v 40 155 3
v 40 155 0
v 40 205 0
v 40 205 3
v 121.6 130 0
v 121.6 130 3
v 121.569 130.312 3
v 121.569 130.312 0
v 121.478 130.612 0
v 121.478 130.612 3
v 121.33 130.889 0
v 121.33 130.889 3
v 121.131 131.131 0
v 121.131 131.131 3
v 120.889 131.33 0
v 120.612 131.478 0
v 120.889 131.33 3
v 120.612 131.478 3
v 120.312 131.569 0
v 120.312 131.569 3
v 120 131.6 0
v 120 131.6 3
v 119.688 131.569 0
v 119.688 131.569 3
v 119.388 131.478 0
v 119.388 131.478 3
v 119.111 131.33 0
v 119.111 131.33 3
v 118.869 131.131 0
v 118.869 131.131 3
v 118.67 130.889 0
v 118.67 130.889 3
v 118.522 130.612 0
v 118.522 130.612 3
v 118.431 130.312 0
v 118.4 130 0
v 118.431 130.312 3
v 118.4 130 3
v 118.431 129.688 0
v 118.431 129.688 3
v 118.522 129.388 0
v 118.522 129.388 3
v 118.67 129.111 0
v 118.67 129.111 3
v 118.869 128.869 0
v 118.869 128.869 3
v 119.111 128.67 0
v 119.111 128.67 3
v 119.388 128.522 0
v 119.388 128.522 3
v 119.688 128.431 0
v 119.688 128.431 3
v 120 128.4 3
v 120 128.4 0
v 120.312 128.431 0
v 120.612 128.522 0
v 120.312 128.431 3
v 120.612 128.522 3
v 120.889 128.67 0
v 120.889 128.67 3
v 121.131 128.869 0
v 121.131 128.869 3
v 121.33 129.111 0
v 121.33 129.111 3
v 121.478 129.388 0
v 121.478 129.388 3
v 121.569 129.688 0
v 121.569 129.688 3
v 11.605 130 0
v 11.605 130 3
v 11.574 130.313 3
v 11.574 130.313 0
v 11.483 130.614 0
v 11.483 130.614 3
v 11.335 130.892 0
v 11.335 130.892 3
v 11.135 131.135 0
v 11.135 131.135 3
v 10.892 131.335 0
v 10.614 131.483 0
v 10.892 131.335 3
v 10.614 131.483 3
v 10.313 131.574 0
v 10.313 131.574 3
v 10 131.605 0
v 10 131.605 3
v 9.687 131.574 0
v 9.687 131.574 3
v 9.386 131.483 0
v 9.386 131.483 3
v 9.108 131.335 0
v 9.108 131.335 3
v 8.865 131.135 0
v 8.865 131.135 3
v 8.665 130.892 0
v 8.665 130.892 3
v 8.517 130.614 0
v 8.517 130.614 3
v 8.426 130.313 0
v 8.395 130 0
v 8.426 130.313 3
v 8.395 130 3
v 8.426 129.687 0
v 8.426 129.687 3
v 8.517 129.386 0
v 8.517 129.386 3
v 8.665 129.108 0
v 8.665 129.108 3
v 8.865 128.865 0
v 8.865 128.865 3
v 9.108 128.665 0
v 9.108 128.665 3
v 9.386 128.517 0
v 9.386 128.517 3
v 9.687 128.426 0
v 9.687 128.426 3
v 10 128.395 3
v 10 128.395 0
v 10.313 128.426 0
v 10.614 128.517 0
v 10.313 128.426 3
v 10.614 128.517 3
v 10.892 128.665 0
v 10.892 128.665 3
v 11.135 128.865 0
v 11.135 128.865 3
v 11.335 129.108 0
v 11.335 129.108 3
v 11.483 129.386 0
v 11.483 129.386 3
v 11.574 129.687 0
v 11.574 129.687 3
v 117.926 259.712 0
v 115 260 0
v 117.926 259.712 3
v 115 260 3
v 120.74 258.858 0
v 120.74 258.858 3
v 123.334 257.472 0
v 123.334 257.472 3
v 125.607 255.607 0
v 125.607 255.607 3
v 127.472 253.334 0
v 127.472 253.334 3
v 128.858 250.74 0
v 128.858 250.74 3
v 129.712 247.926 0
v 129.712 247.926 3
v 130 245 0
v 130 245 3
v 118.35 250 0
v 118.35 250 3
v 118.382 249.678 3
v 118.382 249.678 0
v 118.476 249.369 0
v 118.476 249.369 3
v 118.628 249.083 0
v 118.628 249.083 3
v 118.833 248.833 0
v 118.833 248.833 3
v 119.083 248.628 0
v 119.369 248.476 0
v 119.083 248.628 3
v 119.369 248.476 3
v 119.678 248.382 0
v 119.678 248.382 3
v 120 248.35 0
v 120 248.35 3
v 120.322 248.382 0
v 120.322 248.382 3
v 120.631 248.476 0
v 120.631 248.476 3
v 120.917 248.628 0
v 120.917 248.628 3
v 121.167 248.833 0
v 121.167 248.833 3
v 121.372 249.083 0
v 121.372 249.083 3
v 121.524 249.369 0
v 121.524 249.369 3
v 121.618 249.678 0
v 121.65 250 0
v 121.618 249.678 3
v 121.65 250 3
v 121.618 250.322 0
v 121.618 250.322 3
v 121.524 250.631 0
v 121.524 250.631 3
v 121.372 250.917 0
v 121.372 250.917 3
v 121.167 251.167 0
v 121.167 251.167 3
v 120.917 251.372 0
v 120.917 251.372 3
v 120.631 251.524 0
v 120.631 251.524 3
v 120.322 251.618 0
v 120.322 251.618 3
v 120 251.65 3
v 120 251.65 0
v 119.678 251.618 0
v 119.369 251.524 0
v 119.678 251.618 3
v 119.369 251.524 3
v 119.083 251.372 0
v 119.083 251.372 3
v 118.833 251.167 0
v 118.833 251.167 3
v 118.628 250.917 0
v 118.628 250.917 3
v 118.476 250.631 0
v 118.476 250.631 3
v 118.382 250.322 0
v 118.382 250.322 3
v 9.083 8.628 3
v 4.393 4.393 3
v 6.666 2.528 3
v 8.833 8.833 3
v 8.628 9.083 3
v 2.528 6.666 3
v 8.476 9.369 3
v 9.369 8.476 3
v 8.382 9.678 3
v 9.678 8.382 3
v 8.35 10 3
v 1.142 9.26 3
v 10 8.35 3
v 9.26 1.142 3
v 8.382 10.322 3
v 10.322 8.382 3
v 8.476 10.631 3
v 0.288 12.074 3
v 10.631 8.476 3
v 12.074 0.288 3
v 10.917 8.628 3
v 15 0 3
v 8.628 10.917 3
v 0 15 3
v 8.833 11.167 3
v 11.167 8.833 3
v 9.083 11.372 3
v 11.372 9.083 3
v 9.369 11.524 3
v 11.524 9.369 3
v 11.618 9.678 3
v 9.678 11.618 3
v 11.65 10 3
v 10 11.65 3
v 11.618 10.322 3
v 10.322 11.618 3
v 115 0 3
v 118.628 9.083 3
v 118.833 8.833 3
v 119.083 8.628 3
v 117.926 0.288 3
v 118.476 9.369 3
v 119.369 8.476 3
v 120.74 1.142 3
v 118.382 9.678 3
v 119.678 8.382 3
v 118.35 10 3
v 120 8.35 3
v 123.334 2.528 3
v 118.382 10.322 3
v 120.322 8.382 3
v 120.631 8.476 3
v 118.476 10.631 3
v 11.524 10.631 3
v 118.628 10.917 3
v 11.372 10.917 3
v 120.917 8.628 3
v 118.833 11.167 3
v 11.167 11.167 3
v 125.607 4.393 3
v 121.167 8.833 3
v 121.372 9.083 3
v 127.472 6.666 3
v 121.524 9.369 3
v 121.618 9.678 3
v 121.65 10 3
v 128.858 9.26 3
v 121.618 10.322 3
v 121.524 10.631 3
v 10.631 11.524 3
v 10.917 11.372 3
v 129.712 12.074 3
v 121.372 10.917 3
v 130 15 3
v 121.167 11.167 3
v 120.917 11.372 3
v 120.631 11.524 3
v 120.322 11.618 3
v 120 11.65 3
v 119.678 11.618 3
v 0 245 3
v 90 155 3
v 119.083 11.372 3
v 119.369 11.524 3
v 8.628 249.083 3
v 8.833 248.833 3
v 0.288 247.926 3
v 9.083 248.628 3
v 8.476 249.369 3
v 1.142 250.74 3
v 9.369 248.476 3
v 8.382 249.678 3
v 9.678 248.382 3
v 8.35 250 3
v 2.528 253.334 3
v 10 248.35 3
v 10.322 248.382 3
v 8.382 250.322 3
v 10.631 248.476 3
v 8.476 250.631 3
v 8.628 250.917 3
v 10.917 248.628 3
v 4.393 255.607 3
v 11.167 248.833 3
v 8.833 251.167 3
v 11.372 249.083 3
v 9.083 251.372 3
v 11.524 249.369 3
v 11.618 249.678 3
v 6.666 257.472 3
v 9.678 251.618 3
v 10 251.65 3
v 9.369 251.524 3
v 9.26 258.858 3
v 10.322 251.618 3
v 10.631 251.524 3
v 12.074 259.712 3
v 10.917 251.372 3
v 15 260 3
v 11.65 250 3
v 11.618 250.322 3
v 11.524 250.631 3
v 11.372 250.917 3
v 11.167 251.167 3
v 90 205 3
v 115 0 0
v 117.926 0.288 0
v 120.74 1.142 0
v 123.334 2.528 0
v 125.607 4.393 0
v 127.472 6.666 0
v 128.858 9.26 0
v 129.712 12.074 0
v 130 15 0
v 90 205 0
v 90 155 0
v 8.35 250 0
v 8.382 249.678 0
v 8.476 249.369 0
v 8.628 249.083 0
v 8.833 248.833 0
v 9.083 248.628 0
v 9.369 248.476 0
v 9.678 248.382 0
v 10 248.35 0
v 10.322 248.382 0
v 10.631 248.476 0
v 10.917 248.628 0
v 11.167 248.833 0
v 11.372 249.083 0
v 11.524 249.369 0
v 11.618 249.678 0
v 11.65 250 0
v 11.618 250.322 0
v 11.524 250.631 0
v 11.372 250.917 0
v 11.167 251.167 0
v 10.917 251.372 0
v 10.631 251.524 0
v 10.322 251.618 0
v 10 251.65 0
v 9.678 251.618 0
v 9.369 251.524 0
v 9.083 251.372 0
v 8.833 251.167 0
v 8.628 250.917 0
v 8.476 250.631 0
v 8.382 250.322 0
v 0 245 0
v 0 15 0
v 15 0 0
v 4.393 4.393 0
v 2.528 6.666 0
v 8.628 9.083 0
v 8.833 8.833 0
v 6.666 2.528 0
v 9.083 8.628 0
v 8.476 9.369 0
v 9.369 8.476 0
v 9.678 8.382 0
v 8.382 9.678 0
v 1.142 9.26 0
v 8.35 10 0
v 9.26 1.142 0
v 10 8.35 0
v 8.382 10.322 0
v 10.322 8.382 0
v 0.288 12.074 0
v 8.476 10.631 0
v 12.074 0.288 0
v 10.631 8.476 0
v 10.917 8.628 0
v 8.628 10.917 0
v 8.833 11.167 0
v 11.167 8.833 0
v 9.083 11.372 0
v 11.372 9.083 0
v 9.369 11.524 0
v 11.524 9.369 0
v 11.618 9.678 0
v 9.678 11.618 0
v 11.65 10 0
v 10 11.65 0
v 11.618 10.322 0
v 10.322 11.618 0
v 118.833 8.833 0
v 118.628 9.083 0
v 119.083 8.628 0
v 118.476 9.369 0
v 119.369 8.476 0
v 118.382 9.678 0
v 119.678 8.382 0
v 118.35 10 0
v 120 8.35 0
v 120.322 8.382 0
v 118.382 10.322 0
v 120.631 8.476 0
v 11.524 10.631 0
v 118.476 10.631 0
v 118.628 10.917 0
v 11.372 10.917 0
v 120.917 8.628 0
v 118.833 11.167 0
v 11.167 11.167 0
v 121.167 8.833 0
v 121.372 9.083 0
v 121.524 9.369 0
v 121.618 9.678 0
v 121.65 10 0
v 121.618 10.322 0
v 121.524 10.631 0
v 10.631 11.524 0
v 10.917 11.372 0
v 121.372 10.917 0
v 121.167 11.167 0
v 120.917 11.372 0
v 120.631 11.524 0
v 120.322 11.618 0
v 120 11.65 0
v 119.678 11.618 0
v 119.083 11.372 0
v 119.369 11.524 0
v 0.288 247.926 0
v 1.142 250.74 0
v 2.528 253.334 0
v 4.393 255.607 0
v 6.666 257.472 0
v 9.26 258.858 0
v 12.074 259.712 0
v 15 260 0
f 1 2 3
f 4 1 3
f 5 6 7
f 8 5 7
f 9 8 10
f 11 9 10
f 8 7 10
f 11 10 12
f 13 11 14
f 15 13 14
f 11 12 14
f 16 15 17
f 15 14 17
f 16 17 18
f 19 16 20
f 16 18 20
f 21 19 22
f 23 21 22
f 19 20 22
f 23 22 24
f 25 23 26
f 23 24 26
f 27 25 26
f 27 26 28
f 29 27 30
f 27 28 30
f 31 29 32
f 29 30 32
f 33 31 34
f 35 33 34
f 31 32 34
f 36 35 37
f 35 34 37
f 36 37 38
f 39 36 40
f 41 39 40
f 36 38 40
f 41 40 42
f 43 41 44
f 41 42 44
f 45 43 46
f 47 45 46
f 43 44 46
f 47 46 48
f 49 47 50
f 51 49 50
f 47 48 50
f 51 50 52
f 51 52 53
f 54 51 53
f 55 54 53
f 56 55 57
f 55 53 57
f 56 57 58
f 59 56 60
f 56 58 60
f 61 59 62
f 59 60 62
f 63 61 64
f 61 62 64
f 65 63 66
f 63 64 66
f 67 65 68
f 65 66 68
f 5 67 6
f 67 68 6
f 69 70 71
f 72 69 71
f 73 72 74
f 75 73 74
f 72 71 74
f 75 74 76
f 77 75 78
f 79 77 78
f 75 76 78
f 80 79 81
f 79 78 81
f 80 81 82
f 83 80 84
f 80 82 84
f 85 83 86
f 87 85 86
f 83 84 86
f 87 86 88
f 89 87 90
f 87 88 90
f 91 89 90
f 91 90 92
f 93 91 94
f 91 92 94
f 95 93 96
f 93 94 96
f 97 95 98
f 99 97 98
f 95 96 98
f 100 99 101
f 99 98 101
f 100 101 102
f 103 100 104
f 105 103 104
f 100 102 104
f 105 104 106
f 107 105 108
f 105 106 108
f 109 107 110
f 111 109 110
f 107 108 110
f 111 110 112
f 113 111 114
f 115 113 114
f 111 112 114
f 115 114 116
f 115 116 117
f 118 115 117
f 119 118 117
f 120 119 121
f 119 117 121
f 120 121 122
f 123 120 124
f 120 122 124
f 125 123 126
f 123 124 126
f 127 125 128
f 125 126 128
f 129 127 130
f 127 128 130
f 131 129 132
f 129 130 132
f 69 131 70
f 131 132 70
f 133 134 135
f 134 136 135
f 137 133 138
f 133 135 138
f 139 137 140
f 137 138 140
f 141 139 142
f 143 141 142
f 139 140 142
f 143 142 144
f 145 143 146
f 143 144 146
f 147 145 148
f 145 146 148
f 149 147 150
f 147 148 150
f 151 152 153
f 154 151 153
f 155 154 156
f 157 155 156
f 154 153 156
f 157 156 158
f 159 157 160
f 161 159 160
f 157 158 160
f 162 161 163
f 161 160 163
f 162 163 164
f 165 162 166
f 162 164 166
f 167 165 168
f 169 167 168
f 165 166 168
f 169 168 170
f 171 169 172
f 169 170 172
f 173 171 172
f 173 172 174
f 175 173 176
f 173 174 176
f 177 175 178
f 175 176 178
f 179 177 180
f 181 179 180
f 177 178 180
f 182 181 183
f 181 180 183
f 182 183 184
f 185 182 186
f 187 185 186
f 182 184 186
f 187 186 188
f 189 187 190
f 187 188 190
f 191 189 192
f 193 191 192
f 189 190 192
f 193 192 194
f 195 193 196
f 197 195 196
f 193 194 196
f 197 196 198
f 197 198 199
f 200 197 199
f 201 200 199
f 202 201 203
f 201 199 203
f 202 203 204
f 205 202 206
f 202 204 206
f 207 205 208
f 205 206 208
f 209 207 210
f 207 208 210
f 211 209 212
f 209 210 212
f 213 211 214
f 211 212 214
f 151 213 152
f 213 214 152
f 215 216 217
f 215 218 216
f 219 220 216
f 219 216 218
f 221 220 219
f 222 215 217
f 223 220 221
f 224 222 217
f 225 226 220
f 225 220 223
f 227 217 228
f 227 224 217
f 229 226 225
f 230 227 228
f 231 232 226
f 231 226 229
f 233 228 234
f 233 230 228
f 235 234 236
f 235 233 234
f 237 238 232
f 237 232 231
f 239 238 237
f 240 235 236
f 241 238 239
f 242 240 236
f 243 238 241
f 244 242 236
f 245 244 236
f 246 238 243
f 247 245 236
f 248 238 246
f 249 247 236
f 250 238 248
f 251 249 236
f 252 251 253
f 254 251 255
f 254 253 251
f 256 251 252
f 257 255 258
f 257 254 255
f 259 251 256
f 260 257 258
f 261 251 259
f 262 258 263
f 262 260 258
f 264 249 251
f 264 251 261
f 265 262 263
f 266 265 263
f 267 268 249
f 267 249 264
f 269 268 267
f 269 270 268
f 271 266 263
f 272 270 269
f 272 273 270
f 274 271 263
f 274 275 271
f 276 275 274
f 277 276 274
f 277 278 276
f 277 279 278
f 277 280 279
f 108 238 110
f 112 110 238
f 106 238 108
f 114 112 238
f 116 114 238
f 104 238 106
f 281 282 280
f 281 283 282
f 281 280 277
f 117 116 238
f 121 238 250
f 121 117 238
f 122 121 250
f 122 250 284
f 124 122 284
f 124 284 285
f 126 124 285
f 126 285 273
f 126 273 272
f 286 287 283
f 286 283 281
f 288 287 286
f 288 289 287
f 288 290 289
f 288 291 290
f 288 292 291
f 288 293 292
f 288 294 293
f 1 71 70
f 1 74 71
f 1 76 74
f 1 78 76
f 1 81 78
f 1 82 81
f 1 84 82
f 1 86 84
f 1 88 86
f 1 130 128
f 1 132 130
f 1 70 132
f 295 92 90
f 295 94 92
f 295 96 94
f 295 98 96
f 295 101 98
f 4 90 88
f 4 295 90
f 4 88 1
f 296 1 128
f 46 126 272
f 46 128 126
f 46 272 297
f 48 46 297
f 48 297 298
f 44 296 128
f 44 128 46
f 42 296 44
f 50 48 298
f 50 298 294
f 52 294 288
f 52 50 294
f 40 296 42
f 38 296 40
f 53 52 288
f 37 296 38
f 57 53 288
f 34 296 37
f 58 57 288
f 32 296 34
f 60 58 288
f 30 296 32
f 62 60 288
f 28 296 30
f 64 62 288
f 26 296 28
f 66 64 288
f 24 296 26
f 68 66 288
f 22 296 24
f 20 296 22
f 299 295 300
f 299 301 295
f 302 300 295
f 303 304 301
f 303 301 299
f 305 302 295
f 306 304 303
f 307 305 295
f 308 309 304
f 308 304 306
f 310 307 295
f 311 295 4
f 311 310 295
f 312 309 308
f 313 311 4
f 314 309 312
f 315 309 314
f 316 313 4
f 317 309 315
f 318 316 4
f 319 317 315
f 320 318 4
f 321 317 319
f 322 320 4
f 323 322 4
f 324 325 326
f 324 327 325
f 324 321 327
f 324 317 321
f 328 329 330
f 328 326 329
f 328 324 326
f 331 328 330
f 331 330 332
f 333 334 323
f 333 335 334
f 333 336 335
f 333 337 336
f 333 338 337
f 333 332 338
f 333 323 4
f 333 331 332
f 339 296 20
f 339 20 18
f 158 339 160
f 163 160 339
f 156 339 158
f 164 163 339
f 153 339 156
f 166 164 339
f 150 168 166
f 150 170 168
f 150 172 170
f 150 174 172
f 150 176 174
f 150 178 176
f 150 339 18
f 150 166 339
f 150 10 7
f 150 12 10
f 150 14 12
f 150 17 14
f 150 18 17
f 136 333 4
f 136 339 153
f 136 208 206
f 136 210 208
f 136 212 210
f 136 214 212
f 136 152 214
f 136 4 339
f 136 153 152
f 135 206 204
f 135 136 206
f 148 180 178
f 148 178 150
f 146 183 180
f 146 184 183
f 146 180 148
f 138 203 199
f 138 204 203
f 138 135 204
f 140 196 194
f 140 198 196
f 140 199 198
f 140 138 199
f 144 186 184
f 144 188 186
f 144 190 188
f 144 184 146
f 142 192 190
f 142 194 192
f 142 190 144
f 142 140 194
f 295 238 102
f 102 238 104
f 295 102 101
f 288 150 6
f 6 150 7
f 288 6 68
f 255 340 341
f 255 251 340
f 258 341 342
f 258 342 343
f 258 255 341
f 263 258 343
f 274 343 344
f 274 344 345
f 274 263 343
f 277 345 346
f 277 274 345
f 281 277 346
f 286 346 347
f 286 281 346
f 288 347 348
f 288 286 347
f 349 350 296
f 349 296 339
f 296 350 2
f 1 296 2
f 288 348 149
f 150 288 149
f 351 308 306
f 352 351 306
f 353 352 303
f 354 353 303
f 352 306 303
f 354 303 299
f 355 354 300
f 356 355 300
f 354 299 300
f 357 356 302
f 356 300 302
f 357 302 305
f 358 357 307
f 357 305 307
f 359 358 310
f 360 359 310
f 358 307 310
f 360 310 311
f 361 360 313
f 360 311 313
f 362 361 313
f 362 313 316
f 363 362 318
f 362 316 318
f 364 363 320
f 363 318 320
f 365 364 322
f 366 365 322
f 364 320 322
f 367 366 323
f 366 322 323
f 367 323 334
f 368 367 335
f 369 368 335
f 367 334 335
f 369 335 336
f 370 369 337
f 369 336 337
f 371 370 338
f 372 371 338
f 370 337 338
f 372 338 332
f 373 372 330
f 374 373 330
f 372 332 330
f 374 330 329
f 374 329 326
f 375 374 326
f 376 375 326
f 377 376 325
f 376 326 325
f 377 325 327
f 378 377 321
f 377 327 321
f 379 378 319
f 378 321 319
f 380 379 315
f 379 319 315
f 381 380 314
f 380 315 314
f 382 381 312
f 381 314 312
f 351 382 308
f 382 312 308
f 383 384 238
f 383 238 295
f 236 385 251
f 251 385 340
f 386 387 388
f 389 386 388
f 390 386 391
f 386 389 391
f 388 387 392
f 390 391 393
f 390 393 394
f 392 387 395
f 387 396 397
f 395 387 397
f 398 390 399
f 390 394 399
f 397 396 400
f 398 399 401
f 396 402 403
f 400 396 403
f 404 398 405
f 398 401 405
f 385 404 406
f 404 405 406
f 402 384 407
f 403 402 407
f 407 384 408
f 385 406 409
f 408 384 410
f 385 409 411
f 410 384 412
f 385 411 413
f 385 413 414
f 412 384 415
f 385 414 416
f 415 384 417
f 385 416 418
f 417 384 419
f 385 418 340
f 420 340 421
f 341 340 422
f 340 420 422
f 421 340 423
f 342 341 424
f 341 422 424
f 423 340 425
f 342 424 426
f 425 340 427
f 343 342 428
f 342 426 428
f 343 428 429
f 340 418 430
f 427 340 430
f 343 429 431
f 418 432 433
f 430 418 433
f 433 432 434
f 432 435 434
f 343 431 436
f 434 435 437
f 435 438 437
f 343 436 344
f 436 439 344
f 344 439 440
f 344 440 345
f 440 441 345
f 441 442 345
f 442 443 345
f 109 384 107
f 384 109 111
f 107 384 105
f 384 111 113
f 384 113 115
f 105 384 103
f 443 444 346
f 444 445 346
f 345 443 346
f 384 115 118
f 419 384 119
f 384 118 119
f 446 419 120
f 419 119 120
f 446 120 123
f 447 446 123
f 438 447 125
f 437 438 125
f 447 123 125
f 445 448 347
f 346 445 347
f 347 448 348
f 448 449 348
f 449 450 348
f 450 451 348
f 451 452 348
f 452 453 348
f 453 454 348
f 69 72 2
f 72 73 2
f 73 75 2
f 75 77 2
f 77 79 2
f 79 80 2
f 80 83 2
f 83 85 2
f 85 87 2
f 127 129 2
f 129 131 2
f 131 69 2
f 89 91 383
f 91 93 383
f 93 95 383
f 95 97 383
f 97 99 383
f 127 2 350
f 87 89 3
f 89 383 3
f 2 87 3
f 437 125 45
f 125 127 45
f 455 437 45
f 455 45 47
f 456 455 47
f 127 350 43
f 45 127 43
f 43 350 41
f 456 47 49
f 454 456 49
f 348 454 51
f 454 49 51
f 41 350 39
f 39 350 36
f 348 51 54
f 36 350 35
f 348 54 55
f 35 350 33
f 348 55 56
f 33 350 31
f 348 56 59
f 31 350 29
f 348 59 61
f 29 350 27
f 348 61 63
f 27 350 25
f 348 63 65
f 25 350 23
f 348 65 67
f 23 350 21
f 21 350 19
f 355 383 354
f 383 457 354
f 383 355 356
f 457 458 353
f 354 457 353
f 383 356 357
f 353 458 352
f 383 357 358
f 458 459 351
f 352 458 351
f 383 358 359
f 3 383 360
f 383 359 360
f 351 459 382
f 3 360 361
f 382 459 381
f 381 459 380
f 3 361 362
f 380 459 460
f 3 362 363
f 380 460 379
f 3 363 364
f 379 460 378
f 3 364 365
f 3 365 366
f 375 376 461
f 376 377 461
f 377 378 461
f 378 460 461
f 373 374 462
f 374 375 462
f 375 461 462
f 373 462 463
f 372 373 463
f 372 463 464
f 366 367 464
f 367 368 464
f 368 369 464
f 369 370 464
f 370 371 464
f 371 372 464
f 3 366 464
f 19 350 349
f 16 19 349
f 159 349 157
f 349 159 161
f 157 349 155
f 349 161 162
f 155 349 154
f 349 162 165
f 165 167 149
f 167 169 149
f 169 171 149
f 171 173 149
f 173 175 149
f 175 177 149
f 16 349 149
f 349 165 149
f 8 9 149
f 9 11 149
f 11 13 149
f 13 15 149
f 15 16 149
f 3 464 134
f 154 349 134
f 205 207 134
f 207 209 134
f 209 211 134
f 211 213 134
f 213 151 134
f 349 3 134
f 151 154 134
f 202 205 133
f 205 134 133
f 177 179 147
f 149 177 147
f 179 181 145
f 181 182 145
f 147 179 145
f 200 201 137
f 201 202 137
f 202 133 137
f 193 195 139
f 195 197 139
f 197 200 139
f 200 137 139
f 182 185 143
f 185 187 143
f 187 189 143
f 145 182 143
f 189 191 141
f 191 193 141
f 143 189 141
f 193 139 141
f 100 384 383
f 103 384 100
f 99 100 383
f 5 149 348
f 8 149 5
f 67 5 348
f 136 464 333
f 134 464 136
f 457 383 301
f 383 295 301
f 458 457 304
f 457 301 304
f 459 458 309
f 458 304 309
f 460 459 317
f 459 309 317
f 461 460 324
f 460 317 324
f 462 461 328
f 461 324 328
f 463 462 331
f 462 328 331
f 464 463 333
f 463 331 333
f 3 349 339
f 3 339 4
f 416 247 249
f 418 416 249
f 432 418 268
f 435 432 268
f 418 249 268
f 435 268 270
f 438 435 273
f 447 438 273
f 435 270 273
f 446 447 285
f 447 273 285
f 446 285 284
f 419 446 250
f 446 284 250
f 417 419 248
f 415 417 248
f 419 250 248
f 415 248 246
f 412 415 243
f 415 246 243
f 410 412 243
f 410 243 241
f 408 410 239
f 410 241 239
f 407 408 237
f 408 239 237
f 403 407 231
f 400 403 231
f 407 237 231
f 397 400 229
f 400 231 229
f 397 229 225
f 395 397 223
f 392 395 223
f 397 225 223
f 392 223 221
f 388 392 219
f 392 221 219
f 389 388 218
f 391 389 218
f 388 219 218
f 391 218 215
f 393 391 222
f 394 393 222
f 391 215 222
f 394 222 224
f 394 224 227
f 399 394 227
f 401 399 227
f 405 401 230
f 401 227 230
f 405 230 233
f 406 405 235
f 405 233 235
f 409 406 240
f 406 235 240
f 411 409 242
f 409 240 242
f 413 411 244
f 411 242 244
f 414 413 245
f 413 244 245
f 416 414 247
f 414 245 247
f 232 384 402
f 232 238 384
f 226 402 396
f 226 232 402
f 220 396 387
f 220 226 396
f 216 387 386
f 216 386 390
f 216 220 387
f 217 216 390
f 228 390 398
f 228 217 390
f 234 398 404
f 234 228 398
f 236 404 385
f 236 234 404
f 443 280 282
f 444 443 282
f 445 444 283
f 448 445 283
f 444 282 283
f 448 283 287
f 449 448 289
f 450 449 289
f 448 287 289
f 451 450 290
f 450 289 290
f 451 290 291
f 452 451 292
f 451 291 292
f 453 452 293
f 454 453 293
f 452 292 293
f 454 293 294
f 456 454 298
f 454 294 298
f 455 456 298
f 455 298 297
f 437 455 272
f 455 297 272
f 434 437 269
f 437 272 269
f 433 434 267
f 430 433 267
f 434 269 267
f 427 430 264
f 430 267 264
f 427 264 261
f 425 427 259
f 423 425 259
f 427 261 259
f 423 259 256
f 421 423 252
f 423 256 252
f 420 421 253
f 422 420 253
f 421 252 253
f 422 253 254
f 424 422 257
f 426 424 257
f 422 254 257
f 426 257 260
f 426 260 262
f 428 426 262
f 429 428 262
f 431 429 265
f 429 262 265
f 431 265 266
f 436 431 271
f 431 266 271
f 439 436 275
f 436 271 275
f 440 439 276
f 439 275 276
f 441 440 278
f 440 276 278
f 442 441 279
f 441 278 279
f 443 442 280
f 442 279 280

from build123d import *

# Parameters (mm, degrees)
SKETCH_1_W          = 130
SKETCH_1_H          = 260
EXTRUDE_1_DEPTH     = 3
SKETCH_2_R          = 1.65
SKETCH_2_R_2        = 1.6
SKETCH_2_R_3        = 1.605
CUT_EXTRUDE_1_DEPTH = 3
SKETCH_3_W          = 50
SKETCH_3_H          = 50
CUT_EXTRUDE_2_DEPTH = 10
FILLET_1_R          = 15


with BuildPart() as part:
    # 草图1 → 凸台-拉伸1 (new body)
    with BuildSketch(Plane.XY):
        with Locations((65, 130)):
            Rectangle(SKETCH_1_W, SKETCH_1_H)
    extrude(amount=EXTRUDE_1_DEPTH)

    # 草图2 → 切除-拉伸1 (cut)
    with BuildSketch(Plane.XY.offset(3)):
        with Locations((120, 10)):
            Circle(SKETCH_2_R)
        with Locations((10, 10)):
            Circle(SKETCH_2_R)
        with Locations(Location((10, 250, 0), (0, 0, 180))):
            Circle(SKETCH_2_R)
        with Locations(Location((120, 250, 0), (0, 0, 180))):
            Circle(SKETCH_2_R)
        with Locations((120, 130)):
            Circle(SKETCH_2_R_2)
        with Locations((10, 130)):
            Circle(SKETCH_2_R_3)
    extrude(amount=-CUT_EXTRUDE_1_DEPTH, mode=Mode.SUBTRACT)

    # 草图3 → 切除-拉伸2 (cut)
    with BuildSketch(Plane(origin=(0, 0, 0), x_dir=(-1, 0, 0), z_dir=(0, 0, -1))):
        with Locations((-65, 180)):
            Rectangle(SKETCH_3_W, SKETCH_3_H)
    extrude(amount=-CUT_EXTRUDE_2_DEPTH, mode=Mode.SUBTRACT)

    # 圆角1
    fillet_1_edges = [part.edges().sort_by_distance(p)[0] for p in [
        (0, 0, 1.5),
        (130, 0, 1.5),
        (130, 260, 1.5),
        (0, 260, 1.5),
    ]]
    fillet(fillet_1_edges, radius=FILLET_1_R)


solid = part.part
